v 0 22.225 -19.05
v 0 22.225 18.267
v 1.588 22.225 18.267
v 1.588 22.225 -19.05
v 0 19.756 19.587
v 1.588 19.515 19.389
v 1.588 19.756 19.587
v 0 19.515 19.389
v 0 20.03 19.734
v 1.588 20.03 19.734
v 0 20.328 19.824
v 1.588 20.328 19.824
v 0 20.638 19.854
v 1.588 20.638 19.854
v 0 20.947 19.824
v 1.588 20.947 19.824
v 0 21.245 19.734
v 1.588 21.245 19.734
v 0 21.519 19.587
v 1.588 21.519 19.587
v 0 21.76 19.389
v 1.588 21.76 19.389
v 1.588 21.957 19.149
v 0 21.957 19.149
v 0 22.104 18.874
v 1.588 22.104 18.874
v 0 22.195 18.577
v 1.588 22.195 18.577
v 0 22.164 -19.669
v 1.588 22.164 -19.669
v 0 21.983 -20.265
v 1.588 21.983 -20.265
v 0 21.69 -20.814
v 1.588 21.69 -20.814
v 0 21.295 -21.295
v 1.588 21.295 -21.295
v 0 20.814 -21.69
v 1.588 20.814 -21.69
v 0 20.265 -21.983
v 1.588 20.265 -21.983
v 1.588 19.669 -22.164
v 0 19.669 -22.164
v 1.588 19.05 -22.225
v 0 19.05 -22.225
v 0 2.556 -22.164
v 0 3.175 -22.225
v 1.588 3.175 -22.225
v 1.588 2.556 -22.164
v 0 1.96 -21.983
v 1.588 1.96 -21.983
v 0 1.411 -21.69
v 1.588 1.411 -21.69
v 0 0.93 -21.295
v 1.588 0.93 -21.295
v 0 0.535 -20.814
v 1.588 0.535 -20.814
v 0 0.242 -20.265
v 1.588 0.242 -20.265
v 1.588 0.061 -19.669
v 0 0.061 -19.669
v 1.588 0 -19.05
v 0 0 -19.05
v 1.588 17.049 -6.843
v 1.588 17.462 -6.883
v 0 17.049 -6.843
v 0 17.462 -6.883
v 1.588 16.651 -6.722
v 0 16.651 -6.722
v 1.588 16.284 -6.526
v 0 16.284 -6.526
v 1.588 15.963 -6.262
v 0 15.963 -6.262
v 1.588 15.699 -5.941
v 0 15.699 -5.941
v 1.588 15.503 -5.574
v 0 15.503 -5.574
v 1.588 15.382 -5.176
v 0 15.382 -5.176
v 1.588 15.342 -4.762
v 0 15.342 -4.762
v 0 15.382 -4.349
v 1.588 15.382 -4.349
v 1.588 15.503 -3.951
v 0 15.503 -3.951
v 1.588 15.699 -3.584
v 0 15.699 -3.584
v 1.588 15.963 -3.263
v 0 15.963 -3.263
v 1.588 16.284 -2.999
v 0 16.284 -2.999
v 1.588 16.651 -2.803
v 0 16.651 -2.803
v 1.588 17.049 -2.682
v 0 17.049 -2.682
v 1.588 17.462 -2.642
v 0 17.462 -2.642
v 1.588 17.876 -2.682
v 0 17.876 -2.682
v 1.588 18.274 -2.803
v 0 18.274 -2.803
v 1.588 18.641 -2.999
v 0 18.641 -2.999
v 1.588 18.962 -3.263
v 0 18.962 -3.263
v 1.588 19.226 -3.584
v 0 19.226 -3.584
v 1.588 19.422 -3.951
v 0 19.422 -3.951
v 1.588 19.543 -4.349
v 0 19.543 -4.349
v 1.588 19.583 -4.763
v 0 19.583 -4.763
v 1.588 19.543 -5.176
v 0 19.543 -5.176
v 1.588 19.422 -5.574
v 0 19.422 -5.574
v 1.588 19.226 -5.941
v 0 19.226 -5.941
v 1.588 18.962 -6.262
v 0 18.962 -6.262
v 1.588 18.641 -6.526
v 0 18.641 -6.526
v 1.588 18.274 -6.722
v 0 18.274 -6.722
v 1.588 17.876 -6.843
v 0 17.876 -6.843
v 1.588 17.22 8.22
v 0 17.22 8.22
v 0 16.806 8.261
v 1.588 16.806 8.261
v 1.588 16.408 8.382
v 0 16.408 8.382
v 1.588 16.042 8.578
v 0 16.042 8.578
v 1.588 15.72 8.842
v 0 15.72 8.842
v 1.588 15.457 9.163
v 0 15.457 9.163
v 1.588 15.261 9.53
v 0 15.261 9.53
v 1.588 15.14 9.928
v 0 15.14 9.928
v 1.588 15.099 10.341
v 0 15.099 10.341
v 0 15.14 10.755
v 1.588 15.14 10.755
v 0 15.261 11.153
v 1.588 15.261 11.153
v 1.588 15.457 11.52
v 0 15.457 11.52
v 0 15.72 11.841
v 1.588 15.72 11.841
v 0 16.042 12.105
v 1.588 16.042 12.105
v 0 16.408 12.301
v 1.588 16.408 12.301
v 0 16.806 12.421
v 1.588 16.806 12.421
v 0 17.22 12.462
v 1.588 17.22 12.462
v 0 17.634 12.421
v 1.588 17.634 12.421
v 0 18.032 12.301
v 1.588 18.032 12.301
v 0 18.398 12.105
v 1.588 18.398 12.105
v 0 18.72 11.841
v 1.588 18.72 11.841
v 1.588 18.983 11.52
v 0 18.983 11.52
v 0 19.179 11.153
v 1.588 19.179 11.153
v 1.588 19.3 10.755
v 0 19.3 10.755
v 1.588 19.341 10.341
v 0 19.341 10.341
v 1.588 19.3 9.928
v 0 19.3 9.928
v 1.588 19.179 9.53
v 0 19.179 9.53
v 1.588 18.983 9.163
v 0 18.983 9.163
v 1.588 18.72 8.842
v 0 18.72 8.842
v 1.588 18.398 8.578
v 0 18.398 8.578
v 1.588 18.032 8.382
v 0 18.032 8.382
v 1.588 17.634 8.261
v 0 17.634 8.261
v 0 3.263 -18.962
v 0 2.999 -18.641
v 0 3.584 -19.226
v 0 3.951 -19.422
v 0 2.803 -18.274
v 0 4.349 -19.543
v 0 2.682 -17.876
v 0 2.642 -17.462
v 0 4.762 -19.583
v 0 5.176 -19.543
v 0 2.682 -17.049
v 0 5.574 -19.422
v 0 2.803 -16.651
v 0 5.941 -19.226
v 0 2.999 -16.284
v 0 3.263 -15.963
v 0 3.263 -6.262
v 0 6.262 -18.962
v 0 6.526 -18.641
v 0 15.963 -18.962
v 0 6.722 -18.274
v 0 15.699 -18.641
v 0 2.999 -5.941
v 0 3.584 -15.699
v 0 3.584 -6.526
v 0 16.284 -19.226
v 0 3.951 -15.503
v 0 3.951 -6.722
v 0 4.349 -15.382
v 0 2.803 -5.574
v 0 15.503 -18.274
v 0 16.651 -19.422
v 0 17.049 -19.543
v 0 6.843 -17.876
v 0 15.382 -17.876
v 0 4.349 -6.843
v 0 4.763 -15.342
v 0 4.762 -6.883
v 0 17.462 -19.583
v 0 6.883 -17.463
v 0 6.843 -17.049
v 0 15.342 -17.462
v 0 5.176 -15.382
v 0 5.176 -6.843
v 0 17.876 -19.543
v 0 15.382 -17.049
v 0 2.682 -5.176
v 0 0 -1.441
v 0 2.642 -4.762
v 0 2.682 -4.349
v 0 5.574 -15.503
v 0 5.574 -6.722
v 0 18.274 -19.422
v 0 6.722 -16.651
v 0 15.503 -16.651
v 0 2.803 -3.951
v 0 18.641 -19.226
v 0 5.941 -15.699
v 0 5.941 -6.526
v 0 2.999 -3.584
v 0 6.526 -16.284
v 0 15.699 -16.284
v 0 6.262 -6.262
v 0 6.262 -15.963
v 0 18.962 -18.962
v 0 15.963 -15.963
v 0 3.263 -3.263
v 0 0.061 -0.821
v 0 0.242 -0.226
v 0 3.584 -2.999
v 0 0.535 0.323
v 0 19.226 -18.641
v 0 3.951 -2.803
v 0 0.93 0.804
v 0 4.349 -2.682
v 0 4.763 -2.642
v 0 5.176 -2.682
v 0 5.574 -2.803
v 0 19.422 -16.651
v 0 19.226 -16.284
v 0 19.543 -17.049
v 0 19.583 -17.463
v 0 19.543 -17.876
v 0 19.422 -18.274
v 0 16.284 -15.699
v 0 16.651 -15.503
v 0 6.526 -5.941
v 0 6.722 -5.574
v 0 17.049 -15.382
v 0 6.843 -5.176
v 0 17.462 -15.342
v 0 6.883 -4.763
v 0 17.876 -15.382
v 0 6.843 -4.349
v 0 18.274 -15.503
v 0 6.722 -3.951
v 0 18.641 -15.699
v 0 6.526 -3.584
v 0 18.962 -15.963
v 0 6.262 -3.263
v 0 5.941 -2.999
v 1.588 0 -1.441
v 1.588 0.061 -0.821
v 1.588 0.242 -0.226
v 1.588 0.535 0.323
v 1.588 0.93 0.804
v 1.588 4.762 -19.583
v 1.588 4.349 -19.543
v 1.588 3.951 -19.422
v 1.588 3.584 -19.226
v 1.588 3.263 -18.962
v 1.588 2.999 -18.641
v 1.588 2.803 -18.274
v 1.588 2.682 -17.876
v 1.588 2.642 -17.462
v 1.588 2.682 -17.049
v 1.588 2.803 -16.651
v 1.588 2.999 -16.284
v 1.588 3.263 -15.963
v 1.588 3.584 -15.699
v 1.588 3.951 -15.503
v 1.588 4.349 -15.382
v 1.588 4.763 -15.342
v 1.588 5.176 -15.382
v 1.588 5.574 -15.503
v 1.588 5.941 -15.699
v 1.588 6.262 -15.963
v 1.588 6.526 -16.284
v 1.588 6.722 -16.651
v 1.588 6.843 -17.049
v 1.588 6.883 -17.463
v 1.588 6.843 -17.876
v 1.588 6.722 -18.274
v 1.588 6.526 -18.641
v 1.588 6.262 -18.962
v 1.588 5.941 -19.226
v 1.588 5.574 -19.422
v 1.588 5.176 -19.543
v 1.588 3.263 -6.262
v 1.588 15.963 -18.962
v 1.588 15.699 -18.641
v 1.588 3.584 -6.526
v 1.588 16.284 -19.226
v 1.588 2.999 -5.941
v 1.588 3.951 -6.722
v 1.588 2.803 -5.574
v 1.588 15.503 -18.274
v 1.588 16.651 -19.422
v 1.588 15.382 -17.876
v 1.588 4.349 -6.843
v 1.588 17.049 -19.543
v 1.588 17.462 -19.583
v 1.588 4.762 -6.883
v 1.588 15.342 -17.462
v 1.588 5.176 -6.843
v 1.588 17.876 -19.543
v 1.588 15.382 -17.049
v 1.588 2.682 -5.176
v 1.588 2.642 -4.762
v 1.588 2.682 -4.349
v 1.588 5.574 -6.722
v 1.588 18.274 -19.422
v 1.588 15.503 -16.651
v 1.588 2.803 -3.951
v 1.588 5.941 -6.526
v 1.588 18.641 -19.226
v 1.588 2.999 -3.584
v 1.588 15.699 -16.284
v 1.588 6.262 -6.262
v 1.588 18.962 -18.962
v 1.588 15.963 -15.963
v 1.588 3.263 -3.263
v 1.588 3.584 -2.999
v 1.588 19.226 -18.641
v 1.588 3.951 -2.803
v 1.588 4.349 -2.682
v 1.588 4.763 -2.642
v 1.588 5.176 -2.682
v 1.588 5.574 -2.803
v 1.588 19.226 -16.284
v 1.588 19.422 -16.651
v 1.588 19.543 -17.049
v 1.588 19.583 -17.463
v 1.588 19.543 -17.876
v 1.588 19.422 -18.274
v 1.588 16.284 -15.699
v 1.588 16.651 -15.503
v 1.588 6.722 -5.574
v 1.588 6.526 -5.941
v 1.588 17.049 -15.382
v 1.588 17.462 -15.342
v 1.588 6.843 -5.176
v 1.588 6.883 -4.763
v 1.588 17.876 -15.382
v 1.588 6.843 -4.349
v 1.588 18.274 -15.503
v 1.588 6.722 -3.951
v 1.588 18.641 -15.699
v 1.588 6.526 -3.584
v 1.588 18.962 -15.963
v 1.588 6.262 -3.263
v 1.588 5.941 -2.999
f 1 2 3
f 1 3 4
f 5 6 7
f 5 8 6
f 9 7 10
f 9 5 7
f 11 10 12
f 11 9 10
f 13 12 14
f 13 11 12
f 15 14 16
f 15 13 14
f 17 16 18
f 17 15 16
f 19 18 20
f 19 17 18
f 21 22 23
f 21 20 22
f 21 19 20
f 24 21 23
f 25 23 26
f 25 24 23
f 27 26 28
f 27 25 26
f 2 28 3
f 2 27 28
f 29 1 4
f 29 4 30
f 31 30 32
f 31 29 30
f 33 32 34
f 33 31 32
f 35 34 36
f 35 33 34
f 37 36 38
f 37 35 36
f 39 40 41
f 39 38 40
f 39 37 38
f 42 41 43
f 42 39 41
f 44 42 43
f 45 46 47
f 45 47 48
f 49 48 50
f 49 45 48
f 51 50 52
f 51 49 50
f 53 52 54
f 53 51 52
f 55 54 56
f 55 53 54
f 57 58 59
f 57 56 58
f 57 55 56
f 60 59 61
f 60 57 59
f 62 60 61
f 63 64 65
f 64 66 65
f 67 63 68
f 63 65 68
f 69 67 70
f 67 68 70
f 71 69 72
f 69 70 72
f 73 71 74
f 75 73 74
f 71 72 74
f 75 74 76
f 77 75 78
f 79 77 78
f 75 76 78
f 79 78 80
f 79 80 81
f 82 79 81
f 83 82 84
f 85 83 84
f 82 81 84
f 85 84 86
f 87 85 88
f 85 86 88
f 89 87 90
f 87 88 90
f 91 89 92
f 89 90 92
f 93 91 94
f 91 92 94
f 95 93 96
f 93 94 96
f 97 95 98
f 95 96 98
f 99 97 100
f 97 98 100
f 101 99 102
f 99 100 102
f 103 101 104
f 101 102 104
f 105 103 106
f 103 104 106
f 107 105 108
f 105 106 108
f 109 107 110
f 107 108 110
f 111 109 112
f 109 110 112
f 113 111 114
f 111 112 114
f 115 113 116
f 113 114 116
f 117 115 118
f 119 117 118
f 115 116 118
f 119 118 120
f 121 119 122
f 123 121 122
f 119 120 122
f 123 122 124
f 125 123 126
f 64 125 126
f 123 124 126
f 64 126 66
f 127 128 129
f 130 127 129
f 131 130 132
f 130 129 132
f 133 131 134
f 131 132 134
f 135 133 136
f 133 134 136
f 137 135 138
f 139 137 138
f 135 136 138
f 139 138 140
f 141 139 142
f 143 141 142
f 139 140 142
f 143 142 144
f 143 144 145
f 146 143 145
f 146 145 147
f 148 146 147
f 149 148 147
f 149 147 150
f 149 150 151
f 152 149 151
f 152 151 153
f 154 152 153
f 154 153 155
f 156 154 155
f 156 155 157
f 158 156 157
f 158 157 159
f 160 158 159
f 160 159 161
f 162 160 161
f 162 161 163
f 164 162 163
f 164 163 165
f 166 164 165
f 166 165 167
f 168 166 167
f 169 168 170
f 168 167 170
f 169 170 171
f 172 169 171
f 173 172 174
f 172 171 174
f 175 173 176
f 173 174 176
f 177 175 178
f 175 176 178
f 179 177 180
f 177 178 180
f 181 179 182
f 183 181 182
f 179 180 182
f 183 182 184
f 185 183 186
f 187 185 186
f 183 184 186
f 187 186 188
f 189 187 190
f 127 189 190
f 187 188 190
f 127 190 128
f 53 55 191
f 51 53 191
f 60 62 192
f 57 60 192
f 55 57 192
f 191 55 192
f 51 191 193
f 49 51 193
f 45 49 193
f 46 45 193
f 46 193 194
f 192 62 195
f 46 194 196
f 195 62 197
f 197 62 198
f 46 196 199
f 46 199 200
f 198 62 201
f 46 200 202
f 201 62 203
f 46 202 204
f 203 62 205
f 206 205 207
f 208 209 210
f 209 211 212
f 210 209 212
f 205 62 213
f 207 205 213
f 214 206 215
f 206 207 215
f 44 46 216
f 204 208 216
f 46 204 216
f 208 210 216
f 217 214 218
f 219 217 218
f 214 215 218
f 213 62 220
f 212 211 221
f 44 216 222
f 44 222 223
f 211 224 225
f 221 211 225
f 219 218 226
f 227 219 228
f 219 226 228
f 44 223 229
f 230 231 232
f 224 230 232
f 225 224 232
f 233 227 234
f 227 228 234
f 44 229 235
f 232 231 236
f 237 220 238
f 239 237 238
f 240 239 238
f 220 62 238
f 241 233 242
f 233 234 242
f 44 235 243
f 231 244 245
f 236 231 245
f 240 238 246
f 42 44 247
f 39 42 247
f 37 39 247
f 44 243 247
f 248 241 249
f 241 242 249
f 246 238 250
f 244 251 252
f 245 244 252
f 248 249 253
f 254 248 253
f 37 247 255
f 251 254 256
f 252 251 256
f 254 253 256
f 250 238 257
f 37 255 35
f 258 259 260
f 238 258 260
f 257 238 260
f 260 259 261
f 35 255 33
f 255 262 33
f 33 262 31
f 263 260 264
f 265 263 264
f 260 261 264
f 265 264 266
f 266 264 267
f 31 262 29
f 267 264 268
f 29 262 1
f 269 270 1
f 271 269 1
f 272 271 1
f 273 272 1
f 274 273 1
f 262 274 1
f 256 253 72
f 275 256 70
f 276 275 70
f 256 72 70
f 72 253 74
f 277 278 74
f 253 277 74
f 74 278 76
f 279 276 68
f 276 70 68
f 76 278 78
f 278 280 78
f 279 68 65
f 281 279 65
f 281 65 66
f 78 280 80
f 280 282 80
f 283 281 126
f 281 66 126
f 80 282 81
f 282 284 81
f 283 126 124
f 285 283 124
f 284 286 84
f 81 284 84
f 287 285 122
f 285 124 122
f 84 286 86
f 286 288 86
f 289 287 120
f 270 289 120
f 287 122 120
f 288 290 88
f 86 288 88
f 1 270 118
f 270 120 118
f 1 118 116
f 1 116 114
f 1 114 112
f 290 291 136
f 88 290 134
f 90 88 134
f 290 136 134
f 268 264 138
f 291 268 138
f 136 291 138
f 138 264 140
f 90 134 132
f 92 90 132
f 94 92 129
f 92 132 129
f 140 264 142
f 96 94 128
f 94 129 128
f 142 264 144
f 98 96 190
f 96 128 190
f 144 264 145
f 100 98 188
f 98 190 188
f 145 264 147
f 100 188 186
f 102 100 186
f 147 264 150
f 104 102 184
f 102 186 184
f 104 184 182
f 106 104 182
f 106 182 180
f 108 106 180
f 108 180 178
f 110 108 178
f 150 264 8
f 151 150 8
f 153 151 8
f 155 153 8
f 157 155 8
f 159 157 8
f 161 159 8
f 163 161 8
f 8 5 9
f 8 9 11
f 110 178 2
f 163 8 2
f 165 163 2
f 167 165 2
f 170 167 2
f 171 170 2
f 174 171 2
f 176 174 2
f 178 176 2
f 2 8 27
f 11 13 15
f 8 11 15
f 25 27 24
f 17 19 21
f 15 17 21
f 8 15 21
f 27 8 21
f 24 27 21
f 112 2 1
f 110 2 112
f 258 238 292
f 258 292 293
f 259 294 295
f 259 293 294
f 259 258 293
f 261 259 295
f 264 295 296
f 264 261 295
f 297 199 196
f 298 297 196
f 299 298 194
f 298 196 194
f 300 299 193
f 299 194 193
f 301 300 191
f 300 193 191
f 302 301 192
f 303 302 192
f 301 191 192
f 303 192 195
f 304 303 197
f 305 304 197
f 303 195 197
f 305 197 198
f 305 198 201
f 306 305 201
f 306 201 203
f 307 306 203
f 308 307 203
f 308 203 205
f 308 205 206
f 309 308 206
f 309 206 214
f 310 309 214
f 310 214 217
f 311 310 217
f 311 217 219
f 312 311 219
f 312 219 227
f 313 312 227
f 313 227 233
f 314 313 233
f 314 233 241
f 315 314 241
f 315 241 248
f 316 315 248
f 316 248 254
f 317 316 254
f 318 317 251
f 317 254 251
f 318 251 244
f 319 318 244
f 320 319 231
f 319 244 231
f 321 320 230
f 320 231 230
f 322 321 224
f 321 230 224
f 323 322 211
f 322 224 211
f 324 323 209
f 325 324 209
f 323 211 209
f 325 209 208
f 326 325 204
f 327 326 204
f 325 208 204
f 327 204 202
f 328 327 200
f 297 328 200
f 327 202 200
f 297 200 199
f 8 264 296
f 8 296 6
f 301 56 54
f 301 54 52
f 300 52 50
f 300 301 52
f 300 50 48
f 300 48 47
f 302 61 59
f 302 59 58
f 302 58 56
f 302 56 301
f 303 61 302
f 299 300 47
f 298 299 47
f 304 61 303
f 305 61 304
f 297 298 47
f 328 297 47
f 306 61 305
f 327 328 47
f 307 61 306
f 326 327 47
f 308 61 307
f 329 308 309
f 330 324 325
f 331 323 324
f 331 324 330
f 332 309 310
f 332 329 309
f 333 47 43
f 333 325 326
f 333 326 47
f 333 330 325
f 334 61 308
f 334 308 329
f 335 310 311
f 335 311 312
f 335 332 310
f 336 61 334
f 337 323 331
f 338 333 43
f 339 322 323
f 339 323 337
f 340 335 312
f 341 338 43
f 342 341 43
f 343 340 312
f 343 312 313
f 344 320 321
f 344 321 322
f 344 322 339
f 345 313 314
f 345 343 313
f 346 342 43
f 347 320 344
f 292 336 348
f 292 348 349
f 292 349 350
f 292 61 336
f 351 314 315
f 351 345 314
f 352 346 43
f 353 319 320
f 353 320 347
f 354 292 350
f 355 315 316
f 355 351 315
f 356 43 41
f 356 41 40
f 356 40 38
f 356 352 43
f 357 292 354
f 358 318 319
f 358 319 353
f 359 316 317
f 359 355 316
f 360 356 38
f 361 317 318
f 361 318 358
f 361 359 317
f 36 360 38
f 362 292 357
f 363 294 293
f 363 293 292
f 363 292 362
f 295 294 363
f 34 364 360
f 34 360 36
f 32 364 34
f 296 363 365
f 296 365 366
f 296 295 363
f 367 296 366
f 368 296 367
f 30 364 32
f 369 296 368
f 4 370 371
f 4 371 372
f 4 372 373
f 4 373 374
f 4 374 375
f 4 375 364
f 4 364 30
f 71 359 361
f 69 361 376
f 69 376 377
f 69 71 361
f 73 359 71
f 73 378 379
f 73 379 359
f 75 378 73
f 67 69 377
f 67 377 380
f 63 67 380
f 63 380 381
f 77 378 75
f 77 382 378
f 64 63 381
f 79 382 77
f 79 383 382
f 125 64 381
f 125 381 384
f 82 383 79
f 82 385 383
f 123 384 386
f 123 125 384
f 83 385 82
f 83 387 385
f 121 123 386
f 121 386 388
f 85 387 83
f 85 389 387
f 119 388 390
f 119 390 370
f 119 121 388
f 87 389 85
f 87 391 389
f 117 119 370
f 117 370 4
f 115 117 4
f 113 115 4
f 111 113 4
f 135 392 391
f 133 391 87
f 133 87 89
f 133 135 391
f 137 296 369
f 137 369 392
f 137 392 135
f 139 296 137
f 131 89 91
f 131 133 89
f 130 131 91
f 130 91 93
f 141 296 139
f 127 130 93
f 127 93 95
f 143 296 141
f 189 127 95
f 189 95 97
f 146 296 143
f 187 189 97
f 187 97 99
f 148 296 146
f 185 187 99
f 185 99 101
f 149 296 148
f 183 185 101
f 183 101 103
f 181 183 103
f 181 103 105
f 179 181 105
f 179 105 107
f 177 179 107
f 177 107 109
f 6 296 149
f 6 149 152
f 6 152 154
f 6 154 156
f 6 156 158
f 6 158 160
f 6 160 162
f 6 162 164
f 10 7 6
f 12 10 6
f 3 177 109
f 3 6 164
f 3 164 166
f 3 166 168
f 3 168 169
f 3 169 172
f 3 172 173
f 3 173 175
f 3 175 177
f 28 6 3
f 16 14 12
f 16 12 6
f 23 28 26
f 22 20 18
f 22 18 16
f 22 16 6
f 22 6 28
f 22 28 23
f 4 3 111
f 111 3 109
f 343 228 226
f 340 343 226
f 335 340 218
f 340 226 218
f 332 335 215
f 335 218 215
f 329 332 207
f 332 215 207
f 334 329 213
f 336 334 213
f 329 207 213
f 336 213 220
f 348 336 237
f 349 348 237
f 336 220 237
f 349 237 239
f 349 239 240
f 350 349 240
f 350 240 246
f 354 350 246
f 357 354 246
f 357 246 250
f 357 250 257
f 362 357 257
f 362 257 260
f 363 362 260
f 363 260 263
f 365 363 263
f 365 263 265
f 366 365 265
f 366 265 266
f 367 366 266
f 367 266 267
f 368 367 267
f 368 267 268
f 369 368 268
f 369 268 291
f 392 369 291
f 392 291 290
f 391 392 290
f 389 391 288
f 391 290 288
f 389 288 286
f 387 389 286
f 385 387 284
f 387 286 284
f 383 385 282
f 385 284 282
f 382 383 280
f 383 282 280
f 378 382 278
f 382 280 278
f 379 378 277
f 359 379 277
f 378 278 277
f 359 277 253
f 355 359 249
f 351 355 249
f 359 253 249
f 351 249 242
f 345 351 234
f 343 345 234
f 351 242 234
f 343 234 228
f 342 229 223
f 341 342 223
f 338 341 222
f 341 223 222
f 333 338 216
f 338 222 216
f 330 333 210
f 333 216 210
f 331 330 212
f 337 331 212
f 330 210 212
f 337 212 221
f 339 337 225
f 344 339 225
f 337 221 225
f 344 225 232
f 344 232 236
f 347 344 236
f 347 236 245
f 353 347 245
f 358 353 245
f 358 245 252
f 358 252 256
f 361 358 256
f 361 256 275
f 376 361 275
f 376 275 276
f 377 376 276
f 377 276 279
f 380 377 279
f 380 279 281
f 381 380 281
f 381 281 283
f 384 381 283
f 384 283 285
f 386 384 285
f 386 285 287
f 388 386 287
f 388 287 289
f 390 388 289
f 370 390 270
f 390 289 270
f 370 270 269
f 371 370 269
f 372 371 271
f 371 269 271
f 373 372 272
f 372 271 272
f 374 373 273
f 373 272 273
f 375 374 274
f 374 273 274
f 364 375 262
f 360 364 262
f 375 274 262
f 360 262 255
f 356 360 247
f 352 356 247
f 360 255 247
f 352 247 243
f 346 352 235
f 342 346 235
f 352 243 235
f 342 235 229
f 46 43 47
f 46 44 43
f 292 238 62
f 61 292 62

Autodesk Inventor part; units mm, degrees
ref_plane "YZ Plane" through (0, 0, 0) normal (1, 0, 0) x (0, 1, 0)
ref_plane "XZ Plane" through (0, 0, 0) normal (0, 1, 0) x (-1, 0, 0)
ref_plane "XY Plane" through (0, 0, 0) normal (0, 0, 1) x (1, 0, 0)
sketch "Sketch1" plane through (0, 0, 0) normal (1, 0, 0) x (0, 1, 0)
  arc A0 (0, -19.05) -> (3.175, -22.225) centre (3.175, -19.05) ccw
  arc A1 (19.05, -22.225) -> (22.225, -19.05) centre (19.05, -19.05) ccw
  line L0 (0, -1.4407) -> (0, -19.05)
  line L1 (0.9299, 0.8044) -> (19.515, 19.3894)
  line L2 (22.225, 18.2669) -> (22.225, -19.05)
  line L3 (19.05, -22.225) -> (3.175, -22.225)
  arc A2 (22.225, 18.2669) -> (19.515, 19.3894) centre (20.6375, 18.2669) ccw
  arc A3 (0.9299, 0.8044) -> (0, -1.4407) centre (3.175, -1.4407) ccw
  point P0 (0, -22.225)
  point P1 (22.225, -22.225)
  dimension "d1" = 22.225
  dimension "d6" = 3.175
  dimension "d46" = 1.5875
  dimension "d47" = 3.175
extrude "Extrusion1" add sketch "Sketch1" along normal blind 1.5875
sketch "Sketch2" plane through (1.5875, 0, 0) normal (1, 0, 0) x (0, 0, -1)
  line L0 (22.225, 3.175) -> (22.225, 19.05) projected
  line L1 (0, 11.1125) -> (4.7625, 11.1125)
  line L2 (4.7625, 11.1125) -> (17.4625, 11.1125)
  line L3 (17.4625, 11.1125) -> (22.225, 11.1125)
  line L4 (4.7625, 11.1125) -> (4.7625, 17.4625)
  line L5 (17.4625, 17.4625) -> (17.4625, 4.7625)
  line L6 (4.7625, 4.7625) -> (4.7625, 11.1125)
  line L7 (4.7625, 17.4625) -> (-17.3369, 17.4625)
  line L8 (-19.3894, 19.515) -> (-0.8044, 0.9299) projected
  line L9 (-17.3369, 17.4625) -> (-13.9604, 20.8391)
  line L10 (-17.3369, 17.4625) -> (-12.5617, 17.4625) construction
  line L11 (-13.9604, 20.8391) -> (-6.7223, 13.601)
  line L12 (-13.9604, 20.8391) -> (-3.7242, 20.8391) construction
  point P0 (0, 0)
  point P1 (-10.3413, 17.22)
  dimension "d13" = 4.7625
  dimension "d14" = 12.7
  dimension "d15" = 6.35
  dimension "d16" = 12.7
  dimension "d49" = 4.7752
  dimension "d50" = 45
  dimension "d51" = 10.2362
  dimension "d52" = 45
hole "Hole1" at (1.5875, 17.4625, -4.7625) at (1.5875, 4.7625, -4.7625) at (1.5875, 17.22, 10.3413) at (1.5875, 17.4625, -17.4625) at (1.5875, 4.7625, -17.4625) direction (-1, 0, 0) diameter 4.2418 end through all
sketch "Sketch3" plane through (1.5875, 0, 0) normal (1, 0, 0) x (0, 0, -1)
  line L0 (1.4407, 0) -> (19.05, 0) projected
  line L1 (12.4554, 0) -> (12.4554, 22.225)
  line L2 (19.05, 22.225) -> (-18.2669, 22.225) projected
  point P0 (0, 0)
split "Split1" [suppressed]
properties part number "sled" material "Polycarbonate, Smoke"
